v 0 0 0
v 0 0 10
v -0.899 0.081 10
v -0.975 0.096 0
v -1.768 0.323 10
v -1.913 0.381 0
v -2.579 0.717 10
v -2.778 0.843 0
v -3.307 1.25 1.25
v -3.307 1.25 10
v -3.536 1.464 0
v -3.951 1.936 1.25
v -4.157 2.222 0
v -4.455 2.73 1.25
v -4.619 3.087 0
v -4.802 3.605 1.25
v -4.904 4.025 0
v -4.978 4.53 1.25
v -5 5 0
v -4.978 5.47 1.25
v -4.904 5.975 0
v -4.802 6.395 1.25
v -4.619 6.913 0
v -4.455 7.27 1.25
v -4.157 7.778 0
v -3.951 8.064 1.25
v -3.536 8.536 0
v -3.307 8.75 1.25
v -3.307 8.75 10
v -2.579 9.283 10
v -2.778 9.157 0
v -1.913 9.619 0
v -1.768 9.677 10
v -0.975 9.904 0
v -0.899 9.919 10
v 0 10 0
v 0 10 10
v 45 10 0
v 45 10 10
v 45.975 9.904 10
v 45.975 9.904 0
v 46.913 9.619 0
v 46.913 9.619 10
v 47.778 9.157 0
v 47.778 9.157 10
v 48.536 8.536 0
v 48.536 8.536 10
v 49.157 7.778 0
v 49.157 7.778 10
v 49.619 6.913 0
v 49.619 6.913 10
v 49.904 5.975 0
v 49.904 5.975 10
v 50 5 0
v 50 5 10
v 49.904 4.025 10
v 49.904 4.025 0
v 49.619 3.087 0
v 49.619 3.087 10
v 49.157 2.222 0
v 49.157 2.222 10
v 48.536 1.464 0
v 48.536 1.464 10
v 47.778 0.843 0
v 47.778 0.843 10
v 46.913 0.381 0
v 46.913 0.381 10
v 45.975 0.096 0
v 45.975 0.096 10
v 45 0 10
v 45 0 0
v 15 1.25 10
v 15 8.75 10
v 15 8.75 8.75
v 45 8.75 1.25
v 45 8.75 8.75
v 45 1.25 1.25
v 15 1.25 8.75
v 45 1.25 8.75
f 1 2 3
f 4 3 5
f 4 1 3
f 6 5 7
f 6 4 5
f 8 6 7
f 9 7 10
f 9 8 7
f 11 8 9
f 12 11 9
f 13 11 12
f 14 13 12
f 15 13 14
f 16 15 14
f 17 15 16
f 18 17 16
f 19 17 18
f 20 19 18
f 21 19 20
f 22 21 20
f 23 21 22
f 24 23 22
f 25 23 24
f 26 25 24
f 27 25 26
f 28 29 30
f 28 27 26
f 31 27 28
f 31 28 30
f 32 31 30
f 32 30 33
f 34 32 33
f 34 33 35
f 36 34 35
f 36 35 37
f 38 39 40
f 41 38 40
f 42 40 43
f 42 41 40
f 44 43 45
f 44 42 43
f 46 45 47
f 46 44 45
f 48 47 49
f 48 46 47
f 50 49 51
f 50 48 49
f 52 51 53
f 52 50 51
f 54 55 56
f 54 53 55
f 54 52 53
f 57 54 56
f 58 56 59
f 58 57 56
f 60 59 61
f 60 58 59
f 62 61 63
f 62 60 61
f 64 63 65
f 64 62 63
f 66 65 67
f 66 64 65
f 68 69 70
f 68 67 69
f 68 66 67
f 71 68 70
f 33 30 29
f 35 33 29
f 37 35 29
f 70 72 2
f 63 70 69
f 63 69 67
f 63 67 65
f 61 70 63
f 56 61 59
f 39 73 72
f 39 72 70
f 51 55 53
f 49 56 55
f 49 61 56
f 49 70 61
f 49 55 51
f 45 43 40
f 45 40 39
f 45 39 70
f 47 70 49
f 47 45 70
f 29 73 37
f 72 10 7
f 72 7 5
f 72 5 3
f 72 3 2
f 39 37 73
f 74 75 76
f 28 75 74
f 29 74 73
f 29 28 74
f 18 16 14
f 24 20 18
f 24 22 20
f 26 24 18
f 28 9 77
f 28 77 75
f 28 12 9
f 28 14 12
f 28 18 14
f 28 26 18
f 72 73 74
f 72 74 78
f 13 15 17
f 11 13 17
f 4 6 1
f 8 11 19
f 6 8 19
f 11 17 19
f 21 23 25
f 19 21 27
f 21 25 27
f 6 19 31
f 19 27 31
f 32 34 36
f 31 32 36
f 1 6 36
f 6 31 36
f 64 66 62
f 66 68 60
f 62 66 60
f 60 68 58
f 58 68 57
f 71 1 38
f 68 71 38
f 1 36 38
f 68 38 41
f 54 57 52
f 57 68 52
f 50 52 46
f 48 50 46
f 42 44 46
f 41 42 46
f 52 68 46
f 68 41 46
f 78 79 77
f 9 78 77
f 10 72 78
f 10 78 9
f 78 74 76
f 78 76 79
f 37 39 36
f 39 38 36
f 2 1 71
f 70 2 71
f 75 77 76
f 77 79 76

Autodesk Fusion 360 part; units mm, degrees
sketch "Sketch1" plane through (0, 0, 0) normal (0, 0, 1) x (1, 0, 0)
  line L0 (0, 0) -> (45, 0)
  line L1 (45, 10) -> (0, 10)
  arc A0 (0, 10) -> (0, 0) centre (0, 5) ccw
  arc A1 (45, 0) -> (45, 10) centre (45, 5) ccw
  dimension "d1" = 10
  dimension "d2" = 45
extrude "Extrude1" add sketch "Sketch1" along normal blind 10
sketch "Sketch2" plane through (0, 0, 0) normal (1, 0, 0) x (0, 1, 0)
  line L0 (1.25, 1.25) -> (8.75, 1.25)
  line L1 (8.75, 1.25) -> (8.75, 8.75)
  line L2 (8.75, 8.75) -> (1.25, 8.75)
  line L3 (1.25, 8.75) -> (1.25, 1.25)
  line L4 (10, 1.25) -> (8.75, 1.25) construction
  line L5 (0, 1.25) -> (1.25, 1.25) construction
  line L6 (0, 0) -> (0, 10)
  line L7 (10, 0) -> (10, 10)
  line L8 (8.75, 8.75) -> (8.75, 10) construction
  line L9 (8.75, 1.25) -> (8.75, 0) construction
  line L10 (10, 0) -> (0, 0)
  line L11 (10, 10) -> (0, 10)
  point P0 (10, 0)
  dimension "d5" = 7.5
  dimension "d6" = 7.5
extrude "Extrude2" cut sketch "Sketch2" along normal blind 45 and the other way through all contours L0 L1 L2 L3
sketch "Sketch3" plane through (0, 0, 10) normal (0, 0, 1) x (-1, 0, 0)
  arc A0 (-45, 0) -> (-45, -10) centre (-45, -5) ccw
  line L0 (-45, -10) -> (0, -10)
  arc A1 (0, -10) -> (0, 0) centre (0, -5) ccw
  line L1 (0, 0) -> (-45, 0)
  line L2 (5, -8.75) -> (-15, -8.75)
  line L3 (-15, -8.75) -> (-15, -1.25)
  line L4 (-15, -1.25) -> (5, -1.25)
  line L5 (5, -1.25) -> (5, -8.75)
  line L6 (5, -8.75) -> (5, -10) construction
  line L7 (5, -1.25) -> (5, 0) construction
  dimension "d11" = 7.5
  dimension "d12" = 30
extrude "Extrude3" cut sketch "Sketch3" against normal up to surface (1.25 mm away) contours A1 L2 L3 L4
